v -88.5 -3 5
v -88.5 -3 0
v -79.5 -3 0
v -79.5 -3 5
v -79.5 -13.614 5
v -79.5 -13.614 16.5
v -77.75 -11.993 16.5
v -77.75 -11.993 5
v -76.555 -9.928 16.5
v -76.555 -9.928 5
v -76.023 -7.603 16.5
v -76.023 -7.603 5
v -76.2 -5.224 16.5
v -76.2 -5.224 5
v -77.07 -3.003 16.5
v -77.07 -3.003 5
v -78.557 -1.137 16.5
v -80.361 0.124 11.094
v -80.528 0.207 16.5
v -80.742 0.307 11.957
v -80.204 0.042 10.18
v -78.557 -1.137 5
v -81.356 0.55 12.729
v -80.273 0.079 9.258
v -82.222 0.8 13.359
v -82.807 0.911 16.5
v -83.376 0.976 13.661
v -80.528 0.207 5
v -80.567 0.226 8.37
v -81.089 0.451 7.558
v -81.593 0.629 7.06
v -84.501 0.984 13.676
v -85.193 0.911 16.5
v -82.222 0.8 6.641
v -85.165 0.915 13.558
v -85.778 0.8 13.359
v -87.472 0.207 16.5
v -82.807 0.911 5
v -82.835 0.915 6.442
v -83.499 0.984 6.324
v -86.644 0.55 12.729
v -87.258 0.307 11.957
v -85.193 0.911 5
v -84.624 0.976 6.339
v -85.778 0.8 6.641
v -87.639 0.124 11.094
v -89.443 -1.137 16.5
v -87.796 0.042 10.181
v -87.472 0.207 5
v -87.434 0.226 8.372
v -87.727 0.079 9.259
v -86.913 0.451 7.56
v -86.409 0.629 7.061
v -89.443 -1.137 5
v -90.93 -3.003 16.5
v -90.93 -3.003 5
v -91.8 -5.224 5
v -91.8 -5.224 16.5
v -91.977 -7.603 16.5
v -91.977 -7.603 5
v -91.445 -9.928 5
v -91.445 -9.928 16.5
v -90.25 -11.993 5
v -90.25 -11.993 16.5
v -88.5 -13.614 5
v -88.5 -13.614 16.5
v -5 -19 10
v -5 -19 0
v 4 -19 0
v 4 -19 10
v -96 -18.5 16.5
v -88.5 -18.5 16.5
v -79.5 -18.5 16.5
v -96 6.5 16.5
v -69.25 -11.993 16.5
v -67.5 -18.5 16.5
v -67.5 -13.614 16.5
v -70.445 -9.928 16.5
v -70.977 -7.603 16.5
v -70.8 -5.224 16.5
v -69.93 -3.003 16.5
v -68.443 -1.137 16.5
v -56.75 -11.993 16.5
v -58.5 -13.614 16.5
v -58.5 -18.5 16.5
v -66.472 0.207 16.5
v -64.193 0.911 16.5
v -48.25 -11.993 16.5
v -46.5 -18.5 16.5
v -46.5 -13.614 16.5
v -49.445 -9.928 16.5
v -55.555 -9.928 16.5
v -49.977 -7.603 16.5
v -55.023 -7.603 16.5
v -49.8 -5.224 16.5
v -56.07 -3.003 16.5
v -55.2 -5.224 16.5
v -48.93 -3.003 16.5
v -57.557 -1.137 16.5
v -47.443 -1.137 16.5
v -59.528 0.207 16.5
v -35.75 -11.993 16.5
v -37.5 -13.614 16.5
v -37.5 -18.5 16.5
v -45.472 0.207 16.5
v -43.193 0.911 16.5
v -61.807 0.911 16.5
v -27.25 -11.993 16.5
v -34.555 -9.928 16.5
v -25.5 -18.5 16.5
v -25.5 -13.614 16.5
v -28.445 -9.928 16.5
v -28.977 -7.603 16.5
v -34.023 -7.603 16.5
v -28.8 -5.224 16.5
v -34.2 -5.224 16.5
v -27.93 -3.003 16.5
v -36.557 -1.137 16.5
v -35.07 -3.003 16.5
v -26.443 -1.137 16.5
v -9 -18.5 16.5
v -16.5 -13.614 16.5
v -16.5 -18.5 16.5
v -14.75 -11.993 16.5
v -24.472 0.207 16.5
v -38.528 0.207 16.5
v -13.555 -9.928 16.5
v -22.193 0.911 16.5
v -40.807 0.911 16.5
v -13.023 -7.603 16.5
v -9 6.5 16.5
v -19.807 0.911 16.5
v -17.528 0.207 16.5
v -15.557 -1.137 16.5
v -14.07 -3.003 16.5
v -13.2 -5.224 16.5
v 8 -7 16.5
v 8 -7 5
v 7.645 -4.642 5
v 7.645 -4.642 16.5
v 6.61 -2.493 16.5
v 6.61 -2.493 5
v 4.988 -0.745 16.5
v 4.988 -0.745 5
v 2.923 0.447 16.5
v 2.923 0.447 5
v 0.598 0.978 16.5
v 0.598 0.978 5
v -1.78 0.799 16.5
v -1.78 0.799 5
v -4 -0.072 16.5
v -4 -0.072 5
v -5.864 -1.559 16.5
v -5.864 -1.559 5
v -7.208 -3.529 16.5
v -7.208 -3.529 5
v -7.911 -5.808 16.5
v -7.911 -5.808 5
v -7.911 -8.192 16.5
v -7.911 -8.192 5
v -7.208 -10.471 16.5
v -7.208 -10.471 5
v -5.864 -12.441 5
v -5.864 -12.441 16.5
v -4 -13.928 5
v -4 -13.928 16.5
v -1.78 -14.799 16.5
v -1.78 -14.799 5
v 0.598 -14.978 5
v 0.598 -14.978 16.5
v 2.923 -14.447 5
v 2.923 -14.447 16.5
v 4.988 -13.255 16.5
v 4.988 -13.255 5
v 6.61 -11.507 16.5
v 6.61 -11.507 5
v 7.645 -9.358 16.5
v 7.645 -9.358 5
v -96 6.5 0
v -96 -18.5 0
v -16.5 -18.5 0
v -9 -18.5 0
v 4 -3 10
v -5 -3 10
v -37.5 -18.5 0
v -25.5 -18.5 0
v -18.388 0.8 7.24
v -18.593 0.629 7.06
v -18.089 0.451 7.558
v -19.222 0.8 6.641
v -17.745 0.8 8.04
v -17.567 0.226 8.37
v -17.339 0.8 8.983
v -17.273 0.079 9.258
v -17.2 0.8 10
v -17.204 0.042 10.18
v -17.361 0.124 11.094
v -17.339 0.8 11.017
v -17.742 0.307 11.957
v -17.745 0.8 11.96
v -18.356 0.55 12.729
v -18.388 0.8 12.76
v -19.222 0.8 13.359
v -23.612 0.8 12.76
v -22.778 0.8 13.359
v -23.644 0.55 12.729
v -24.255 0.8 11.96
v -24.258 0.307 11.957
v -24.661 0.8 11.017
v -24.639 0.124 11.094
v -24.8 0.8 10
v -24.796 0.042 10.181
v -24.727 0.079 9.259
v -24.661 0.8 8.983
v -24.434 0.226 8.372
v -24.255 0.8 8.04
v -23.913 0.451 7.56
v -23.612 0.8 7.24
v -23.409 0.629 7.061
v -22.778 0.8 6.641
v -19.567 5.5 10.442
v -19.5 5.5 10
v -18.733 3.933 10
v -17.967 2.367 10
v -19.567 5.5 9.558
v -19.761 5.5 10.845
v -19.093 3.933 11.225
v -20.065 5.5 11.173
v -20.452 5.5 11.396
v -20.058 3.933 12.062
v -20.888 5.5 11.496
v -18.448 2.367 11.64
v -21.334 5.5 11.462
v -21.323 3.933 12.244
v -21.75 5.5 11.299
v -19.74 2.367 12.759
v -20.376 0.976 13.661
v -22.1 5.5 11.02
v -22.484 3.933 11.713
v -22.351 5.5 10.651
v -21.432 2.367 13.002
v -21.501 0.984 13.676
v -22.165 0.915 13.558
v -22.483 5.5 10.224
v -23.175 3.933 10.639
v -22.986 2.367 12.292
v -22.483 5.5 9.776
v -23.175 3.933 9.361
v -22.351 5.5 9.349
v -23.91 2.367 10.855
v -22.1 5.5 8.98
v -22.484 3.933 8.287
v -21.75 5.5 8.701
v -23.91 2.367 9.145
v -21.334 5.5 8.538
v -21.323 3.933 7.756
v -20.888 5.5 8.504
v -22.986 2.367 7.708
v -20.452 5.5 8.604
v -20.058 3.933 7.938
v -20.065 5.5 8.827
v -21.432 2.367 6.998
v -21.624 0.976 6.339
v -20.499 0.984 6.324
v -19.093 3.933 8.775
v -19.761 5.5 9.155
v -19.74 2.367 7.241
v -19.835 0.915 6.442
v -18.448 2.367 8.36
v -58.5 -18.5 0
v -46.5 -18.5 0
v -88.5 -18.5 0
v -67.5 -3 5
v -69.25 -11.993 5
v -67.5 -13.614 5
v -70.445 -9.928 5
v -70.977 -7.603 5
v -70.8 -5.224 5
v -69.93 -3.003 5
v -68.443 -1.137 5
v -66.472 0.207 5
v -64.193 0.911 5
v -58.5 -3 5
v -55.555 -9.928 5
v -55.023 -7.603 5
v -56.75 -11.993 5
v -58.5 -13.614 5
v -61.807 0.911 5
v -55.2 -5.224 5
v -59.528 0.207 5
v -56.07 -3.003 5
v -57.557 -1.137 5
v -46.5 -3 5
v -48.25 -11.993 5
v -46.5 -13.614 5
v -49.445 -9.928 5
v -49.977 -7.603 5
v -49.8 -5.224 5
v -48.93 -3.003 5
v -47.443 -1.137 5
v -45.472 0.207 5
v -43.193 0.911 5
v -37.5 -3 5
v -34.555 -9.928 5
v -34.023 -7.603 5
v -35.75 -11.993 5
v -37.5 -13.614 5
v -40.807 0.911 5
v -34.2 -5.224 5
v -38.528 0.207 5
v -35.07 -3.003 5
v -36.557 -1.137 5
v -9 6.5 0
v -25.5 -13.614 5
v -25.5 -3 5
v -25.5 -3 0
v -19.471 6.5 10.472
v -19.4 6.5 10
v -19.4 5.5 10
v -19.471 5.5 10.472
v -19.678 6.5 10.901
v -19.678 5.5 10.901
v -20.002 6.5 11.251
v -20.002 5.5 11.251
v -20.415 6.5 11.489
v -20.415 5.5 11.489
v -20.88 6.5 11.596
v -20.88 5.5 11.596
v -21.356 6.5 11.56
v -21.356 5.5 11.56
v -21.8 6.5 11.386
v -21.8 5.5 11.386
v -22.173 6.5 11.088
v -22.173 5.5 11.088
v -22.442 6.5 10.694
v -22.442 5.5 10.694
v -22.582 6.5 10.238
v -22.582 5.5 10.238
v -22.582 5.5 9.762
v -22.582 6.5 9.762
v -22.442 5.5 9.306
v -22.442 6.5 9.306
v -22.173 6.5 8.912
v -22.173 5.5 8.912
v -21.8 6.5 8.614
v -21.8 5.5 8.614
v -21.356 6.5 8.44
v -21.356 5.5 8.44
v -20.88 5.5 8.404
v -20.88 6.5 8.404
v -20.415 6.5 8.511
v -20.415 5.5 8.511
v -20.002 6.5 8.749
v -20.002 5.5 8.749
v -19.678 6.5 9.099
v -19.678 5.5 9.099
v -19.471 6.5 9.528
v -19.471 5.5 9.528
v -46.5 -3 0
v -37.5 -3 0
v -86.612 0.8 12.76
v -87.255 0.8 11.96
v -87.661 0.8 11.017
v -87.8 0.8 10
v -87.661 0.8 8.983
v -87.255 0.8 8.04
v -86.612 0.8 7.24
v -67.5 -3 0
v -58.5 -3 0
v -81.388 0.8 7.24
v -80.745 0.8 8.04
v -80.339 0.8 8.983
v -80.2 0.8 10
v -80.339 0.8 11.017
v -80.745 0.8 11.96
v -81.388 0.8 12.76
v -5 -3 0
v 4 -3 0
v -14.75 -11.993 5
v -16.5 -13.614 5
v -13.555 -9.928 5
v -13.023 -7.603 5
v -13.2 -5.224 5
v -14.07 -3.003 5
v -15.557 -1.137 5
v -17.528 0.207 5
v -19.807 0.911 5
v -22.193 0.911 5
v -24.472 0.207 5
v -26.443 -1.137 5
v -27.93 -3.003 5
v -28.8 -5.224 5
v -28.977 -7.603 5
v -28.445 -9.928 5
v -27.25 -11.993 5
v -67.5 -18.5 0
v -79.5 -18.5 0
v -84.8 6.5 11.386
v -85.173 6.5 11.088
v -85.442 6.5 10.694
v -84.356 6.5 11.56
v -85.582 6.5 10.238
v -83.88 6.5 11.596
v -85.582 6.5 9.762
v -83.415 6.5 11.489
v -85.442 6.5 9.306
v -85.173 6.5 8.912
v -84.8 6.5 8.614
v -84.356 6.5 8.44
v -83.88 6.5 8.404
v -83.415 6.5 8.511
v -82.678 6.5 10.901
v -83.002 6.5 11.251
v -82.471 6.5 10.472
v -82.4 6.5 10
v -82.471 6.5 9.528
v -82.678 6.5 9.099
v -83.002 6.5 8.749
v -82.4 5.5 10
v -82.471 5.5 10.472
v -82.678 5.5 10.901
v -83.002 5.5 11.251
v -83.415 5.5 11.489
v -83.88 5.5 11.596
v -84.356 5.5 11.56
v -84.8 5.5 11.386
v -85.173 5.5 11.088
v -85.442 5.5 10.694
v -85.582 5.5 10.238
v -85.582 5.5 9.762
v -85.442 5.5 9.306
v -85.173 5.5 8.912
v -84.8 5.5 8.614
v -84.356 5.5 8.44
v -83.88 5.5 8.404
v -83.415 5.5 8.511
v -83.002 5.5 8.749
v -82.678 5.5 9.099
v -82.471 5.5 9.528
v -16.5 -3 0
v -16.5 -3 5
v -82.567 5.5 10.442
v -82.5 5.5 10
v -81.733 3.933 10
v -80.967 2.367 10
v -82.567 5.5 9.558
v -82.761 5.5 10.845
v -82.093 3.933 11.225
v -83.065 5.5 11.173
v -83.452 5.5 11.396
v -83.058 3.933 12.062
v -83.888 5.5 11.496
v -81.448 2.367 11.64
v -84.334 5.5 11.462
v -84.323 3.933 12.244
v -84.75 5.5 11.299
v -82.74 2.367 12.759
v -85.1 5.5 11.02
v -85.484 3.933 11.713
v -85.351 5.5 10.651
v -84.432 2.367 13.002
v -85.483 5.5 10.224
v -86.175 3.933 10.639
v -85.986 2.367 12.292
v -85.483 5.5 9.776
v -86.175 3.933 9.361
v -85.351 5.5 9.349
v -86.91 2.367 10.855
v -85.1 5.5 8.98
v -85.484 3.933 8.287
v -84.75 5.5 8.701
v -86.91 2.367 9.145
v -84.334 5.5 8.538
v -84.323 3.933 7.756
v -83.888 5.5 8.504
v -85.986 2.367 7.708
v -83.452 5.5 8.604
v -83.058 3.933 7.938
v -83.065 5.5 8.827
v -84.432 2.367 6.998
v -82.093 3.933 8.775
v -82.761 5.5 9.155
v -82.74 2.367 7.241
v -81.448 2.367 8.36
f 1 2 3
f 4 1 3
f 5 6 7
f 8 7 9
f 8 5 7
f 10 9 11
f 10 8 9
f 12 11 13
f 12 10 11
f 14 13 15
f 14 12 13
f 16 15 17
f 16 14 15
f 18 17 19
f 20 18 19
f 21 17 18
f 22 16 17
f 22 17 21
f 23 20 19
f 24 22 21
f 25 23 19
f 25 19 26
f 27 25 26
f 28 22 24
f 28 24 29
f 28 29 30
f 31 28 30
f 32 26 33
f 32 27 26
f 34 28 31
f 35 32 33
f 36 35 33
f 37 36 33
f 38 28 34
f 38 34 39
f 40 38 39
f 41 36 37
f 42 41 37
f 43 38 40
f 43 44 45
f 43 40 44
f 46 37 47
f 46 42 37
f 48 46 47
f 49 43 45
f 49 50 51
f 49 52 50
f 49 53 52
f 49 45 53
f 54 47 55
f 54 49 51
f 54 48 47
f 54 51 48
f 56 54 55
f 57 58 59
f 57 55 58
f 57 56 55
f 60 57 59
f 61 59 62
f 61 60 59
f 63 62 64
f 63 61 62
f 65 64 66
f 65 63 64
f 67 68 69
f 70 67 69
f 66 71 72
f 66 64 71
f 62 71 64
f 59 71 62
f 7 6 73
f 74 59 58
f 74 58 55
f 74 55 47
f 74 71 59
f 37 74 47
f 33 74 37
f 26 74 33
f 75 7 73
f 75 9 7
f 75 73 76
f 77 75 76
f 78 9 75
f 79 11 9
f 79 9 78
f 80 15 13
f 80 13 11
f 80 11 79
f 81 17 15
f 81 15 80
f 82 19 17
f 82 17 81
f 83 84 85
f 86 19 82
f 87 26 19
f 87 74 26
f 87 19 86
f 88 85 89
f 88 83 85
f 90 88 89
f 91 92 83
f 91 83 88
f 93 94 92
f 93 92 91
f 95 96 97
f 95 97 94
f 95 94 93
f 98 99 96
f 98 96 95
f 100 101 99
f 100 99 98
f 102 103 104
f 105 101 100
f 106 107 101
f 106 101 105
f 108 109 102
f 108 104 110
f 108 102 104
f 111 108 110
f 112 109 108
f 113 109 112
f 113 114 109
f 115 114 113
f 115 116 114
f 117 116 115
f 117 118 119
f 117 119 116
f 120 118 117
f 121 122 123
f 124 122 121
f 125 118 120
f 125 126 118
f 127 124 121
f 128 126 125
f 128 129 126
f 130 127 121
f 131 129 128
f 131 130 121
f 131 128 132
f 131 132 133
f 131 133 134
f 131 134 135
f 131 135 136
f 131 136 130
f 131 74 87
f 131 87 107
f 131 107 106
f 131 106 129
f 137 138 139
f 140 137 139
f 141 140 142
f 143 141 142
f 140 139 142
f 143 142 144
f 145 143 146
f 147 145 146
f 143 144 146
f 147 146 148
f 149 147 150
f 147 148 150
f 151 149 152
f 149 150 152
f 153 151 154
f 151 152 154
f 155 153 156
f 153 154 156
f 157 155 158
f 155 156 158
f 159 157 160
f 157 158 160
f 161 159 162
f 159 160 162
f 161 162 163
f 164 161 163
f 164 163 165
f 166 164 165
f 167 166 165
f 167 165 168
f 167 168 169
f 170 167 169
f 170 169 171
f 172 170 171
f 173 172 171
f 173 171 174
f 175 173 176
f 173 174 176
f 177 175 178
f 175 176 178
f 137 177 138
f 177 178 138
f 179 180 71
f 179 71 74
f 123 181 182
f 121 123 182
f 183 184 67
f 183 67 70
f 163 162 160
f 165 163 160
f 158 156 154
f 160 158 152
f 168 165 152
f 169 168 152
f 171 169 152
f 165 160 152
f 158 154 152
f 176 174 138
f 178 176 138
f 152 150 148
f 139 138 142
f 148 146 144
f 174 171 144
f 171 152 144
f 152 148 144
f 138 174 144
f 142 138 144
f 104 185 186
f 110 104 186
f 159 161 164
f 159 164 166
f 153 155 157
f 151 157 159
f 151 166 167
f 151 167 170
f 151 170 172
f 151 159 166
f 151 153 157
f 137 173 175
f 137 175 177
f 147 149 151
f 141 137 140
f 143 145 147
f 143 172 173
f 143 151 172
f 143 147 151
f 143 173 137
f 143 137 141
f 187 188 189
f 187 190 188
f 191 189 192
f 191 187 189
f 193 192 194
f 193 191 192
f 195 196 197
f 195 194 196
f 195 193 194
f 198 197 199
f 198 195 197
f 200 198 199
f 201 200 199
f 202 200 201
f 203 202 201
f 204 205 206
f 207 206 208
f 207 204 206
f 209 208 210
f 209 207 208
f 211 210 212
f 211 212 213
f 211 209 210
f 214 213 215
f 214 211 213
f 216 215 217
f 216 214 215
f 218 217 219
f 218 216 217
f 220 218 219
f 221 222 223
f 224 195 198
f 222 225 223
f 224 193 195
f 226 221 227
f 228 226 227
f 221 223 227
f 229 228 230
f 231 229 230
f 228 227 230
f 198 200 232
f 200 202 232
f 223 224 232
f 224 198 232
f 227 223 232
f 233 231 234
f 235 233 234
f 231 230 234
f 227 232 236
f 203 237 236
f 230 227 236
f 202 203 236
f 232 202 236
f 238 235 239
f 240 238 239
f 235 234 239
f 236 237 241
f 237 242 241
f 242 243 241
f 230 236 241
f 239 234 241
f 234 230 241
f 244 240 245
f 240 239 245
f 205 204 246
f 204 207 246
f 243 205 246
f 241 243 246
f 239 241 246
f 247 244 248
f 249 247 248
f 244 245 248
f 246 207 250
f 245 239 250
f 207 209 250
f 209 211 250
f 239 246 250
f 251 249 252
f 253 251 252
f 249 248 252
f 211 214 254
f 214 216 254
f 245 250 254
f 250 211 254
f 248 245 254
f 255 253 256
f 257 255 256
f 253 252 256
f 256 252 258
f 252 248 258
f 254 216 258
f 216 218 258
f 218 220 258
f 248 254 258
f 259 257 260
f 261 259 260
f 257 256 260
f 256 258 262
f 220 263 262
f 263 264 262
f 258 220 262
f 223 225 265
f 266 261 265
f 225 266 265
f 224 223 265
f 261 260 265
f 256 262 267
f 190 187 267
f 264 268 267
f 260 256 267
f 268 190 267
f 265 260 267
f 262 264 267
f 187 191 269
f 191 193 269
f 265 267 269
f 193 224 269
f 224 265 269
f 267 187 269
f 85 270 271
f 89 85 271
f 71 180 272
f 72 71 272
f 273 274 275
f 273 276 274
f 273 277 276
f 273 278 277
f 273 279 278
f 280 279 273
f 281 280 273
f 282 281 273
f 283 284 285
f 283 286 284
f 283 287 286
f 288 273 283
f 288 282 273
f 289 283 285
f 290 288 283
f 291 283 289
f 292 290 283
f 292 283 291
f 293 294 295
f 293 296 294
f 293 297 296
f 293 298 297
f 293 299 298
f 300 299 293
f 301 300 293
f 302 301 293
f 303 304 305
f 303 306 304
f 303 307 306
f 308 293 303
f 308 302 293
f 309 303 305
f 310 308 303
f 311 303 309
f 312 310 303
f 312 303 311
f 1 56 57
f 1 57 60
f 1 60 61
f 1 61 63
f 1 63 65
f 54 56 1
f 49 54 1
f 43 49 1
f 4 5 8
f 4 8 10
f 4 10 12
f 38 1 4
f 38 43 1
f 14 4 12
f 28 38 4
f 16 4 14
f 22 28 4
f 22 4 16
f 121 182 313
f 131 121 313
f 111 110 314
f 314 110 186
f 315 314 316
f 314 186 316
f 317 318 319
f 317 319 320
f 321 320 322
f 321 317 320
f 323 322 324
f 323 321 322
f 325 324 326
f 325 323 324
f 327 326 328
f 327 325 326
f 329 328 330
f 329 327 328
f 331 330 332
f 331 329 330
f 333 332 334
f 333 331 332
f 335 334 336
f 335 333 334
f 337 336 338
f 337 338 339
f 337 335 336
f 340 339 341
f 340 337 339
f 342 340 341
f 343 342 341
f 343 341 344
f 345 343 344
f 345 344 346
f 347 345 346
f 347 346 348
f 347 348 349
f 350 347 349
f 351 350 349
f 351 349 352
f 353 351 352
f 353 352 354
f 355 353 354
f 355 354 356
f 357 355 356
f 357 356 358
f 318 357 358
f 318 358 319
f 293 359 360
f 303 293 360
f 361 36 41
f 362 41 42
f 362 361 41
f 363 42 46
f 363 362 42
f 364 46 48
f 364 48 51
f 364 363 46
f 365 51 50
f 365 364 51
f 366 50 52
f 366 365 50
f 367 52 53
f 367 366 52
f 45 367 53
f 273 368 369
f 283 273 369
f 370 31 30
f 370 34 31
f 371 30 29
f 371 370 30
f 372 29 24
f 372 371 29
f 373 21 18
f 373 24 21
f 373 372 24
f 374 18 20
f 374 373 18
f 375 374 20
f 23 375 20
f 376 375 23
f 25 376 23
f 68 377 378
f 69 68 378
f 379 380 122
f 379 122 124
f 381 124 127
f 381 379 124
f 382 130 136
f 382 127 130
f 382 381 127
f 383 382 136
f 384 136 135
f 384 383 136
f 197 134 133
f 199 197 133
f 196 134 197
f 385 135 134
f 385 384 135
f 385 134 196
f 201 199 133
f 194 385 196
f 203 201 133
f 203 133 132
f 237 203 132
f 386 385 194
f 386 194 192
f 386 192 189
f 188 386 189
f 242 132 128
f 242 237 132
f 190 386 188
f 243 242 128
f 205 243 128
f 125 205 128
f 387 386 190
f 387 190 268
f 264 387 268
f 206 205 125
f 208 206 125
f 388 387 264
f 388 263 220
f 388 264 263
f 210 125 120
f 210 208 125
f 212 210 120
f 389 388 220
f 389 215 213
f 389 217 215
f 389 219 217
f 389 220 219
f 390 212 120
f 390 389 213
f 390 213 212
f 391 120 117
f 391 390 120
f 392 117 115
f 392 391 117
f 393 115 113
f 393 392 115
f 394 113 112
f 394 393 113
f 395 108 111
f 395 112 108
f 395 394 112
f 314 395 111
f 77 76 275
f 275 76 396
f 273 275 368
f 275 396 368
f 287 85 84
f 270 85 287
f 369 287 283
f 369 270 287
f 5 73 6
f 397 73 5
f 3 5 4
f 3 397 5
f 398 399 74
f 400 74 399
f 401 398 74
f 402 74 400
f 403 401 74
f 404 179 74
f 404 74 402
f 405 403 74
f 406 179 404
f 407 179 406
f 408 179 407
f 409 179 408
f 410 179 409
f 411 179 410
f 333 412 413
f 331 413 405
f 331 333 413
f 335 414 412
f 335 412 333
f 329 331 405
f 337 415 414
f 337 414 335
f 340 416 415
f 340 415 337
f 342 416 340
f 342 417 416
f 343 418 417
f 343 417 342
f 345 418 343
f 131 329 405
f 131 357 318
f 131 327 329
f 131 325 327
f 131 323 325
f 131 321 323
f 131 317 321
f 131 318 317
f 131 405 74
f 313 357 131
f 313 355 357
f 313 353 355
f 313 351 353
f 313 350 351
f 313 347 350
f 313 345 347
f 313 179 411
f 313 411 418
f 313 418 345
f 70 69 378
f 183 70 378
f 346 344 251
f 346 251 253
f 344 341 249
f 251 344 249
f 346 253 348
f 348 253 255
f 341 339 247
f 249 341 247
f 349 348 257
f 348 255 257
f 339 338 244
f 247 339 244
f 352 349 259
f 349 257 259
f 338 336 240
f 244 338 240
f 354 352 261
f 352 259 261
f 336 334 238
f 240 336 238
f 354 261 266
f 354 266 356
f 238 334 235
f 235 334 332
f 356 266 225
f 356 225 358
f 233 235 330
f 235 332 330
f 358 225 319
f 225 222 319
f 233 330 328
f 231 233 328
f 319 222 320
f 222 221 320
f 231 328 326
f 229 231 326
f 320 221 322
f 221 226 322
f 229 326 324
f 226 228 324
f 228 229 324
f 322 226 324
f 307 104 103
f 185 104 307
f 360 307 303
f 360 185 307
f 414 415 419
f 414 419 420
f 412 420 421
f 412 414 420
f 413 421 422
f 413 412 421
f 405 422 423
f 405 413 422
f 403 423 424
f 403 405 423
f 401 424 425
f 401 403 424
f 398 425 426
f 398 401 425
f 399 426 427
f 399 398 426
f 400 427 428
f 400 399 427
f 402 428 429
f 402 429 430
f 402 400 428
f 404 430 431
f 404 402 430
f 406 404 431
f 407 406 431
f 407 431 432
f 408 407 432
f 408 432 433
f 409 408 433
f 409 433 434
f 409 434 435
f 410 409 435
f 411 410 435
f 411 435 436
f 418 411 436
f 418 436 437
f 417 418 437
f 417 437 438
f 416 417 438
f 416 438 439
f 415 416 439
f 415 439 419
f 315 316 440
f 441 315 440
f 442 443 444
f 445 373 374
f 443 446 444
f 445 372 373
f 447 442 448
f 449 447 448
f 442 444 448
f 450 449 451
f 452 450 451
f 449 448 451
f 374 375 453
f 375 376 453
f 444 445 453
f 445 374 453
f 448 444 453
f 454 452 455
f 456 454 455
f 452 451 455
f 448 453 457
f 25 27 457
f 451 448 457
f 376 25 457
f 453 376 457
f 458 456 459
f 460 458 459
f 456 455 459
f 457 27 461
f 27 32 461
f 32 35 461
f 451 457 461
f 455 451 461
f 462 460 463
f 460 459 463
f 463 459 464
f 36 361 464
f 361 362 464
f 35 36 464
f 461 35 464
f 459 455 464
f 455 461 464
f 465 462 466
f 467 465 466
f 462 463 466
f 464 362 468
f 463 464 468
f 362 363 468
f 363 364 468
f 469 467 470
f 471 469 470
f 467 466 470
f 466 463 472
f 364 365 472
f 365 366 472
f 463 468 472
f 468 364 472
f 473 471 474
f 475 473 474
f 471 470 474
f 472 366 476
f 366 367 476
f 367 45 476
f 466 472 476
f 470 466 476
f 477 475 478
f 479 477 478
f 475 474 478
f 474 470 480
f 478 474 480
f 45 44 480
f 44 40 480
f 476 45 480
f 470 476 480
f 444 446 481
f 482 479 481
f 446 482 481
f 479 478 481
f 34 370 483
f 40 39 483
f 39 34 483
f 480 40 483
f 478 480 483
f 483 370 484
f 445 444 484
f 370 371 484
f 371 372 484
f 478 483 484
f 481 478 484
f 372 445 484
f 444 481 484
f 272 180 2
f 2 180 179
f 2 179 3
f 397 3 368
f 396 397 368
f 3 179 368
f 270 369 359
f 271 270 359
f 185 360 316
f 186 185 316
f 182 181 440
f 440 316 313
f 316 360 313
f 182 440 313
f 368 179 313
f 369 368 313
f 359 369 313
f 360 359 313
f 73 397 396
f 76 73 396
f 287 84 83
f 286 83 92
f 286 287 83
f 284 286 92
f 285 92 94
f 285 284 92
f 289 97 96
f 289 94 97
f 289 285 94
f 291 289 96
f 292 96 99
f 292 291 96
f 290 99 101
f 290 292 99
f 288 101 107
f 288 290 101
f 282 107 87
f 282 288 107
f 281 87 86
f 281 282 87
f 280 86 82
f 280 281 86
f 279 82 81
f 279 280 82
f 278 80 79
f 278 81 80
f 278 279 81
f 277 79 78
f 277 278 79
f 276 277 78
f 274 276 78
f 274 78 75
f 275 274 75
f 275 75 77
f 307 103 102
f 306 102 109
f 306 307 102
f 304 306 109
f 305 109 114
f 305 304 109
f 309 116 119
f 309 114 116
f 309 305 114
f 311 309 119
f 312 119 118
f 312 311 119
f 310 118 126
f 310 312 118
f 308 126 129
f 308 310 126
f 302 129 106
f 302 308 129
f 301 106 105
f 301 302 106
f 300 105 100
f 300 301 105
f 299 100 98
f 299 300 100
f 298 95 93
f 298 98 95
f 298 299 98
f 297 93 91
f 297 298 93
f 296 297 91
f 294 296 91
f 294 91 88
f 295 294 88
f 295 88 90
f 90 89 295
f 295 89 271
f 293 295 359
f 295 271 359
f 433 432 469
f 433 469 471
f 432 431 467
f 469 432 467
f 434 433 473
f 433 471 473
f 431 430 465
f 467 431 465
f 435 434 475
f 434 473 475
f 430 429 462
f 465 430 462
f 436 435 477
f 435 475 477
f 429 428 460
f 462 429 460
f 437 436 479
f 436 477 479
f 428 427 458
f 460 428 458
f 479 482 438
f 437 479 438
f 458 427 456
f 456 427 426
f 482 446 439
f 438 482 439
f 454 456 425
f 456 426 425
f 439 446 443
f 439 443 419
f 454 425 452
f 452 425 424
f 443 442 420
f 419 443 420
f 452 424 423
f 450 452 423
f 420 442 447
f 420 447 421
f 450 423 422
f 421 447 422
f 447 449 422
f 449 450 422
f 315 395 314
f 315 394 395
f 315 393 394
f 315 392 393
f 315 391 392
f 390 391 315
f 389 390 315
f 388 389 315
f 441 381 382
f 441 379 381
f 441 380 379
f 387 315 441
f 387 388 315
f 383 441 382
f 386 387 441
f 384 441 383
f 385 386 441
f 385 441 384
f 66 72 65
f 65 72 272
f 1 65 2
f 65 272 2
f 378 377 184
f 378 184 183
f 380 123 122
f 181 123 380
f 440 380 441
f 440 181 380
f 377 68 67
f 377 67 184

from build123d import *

# Parameters (mm, degrees)
BOX_W                  = 9
BOX_H                  = 16
BOX_DEPTH              = 10
CYLINDER_R             = 8
CYLINDER_DEPTH         = 11.5
CONE_ROLL_ANGLE        = 90
CYLINDER005_R          = 1.6
CYLINDER005_DEPTH      = 10
CYLINDER005_ROLL_ANGLE = 90
CYLINDER006_R          = 3.8
CYLINDER006_DEPTH      = 2
CYLINDER006_ROLL_ANGLE = 90
CONE001_ROLL_ANGLE     = 90
CYLINDER007_R          = 1.6
CYLINDER007_DEPTH      = 10
CYLINDER007_ROLL_ANGLE = 90
CYLINDER008_R          = 3.8
CYLINDER008_DEPTH      = 2
CYLINDER008_ROLL_ANGLE = 90
BOX002_W               = 9
BOX002_H               = 16
BOX002_DEPTH           = 18
CYLINDER002_R          = 8
CYLINDER002_DEPTH      = 11.5
BOX005_W               = 9
BOX005_H               = 16
BOX005_DEPTH           = 18
CYLINDER003_R          = 8
CYLINDER003_DEPTH      = 11.5
CYLINDER004_R          = 8
CYLINDER004_DEPTH      = 11.5
BOX003_W               = 9
BOX003_H               = 16
BOX003_DEPTH           = 18
BOX004_W               = 9
BOX004_H               = 16
BOX004_DEPTH           = 18
CYLINDER001_R          = 8
CYLINDER001_DEPTH      = 11.5
BOX001_W               = 87
BOX001_H               = 25
BOX001_DEPTH           = 16.5


with BuildPart() as cube:
    # Box → Box (new body)
    with BuildSketch(Plane(origin=(-5, -19, 0), x_dir=(1, 0, 0), z_dir=(0, 0, 1))):
        with Locations((4.5, 8)):
            Rectangle(BOX_W, BOX_H)
    extrude(amount=BOX_DEPTH)


with BuildPart() as cylinder:
    # Cylinder → Cylinder (new body)
    with BuildSketch(Plane(origin=(0, -7, 5), x_dir=(1, 0, 0), z_dir=(0, 0, 1))):
        Circle(CYLINDER_R)
    extrude(amount=CYLINDER_DEPTH)


with BuildPart() as cone:
    # Cone → Cone (revolve)
    with BuildSketch(Plane.XZ):
        Polygon((0, 0), (1.5, 0), (3.8, 4.7), (0, 4.7), align=None)
    revolve(axis=Axis((0, 0, 0), (0, 0, 1)))


with BuildPart() as cone_1:
    # Cone roll: moved
    add(cone.part.rotate(Axis((0, 0, 0), (1, 0, 0)), CONE_ROLL_ANGLE))


with BuildPart() as cone_2:
    # Cone placement: moved
    add(cone_1.part.moved(Location((-21, 0, 10))))


with BuildPart() as cylinder005:
    # Cylinder005 → Cylinder005 (new body)
    with BuildSketch(Plane.XY):
        Circle(CYLINDER005_R)
    extrude(amount=CYLINDER005_DEPTH)


with BuildPart() as cylinder005_1:
    # Cylinder005 roll: moved
    add(cylinder005.part.rotate(Axis((0, 0, 0), (1, 0, 0)), CYLINDER005_ROLL_ANGLE))


with BuildPart() as cylinder005_2:
    # Cylinder005 placement: moved
    add(cylinder005_1.part.moved(Location((-21, 10, 10))))


with BuildPart() as schraubenloch:
    # Cylinder006 → Cylinder006 (new body)
    with BuildSketch(Plane.XY):
        Circle(CYLINDER006_R)
    extrude(amount=CYLINDER006_DEPTH)


with BuildPart() as schraubenloch_1:
    # Cylinder006 roll: moved
    add(schraubenloch.part.rotate(Axis((0, 0, 0), (1, 0, 0)), CYLINDER006_ROLL_ANGLE))


with BuildPart() as schraubenloch_2:
    # Cylinder006 placement: moved
    add(schraubenloch_1.part.moved(Location((-21, -4.7, 10))))

    # Fusion004: union Cone, Cylinder005
    add(cone_2.part)
    add(cylinder005_2.part)


with BuildPart() as schraubenloch_3:
    # Fusion004 placement: moved
    add(schraubenloch_2.part.moved(Location((0, 5.5, 0))))


with BuildPart() as cone001:
    # Cone001 → Cone001 (revolve)
    with BuildSketch(Plane.XZ):
        Polygon((0, 0), (1.5, 0), (3.8, 4.7), (0, 4.7), align=None)
    revolve(axis=Axis((0, 0, 0), (0, 0, 1)))


with BuildPart() as cone001_1:
    # Cone001 roll: moved
    add(cone001.part.rotate(Axis((0, 0, 0), (1, 0, 0)), CONE001_ROLL_ANGLE))


with BuildPart() as cone001_2:
    # Cone001 placement: moved
    add(cone001_1.part.moved(Location((-21, 0, 10))))


with BuildPart() as cylinder007:
    # Cylinder007 → Cylinder007 (new body)
    with BuildSketch(Plane.XY):
        Circle(CYLINDER007_R)
    extrude(amount=CYLINDER007_DEPTH)


with BuildPart() as cylinder007_1:
    # Cylinder007 roll: moved
    add(cylinder007.part.rotate(Axis((0, 0, 0), (1, 0, 0)), CYLINDER007_ROLL_ANGLE))


with BuildPart() as cylinder007_2:
    # Cylinder007 placement: moved
    add(cylinder007_1.part.moved(Location((-21, 10, 10))))


with BuildPart() as schraubenloecher:
    # Cylinder008 → Cylinder008 (new body)
    with BuildSketch(Plane.XY):
        Circle(CYLINDER008_R)
    extrude(amount=CYLINDER008_DEPTH)


with BuildPart() as schraubenloecher_1:
    # Cylinder008 roll: moved
    add(schraubenloecher.part.rotate(Axis((0, 0, 0), (1, 0, 0)), CYLINDER008_ROLL_ANGLE))


with BuildPart() as schraubenloecher_2:
    # Cylinder008 placement: moved
    add(schraubenloecher_1.part.moved(Location((-21, -4.7, 10))))

    # Fusion005: union Cone001, Cylinder007
    add(cone001_2.part)
    add(cylinder007_2.part)


with BuildPart() as schraubenloecher_3:
    # Fusion005 placement: moved
    add(schraubenloecher_2.part.moved(Location((-63, 5.5, 0))))

    # Fusion006: union Schraubenloch
    add(schraubenloch_3.part)


with BuildPart() as cube002:
    # Box002 → Box002 (new body)
    with BuildSketch(Plane(origin=(-25.5, -19, 0), x_dir=(1, 0, 0), z_dir=(0, 0, 1))):
        with Locations((4.5, 8)):
            Rectangle(BOX002_W, BOX002_H)
    extrude(amount=BOX002_DEPTH)


with BuildPart() as cylinder002:
    # Cylinder002 → Cylinder002 (new body)
    with BuildSketch(Plane(origin=(-42, -7, 5), x_dir=(1, 0, 0), z_dir=(0, 0, 1))):
        Circle(CYLINDER002_R)
    extrude(amount=CYLINDER002_DEPTH)


with BuildPart() as cube005:
    # Box005 → Box005 (new body)
    with BuildSketch(Plane(origin=(-88.5, -19, 0), x_dir=(1, 0, 0), z_dir=(0, 0, 1))):
        with Locations((4.5, 8)):
            Rectangle(BOX005_W, BOX005_H)
    extrude(amount=BOX005_DEPTH)


with BuildPart() as cylinder003:
    # Cylinder003 → Cylinder003 (new body)
    with BuildSketch(Plane(origin=(-63, -7, 5), x_dir=(1, 0, 0), z_dir=(0, 0, 1))):
        Circle(CYLINDER003_R)
    extrude(amount=CYLINDER003_DEPTH)


with BuildPart() as cylinder004:
    # Cylinder004 → Cylinder004 (new body)
    with BuildSketch(Plane(origin=(-84, -7, 5), x_dir=(1, 0, 0), z_dir=(0, 0, 1))):
        Circle(CYLINDER004_R)
    extrude(amount=CYLINDER004_DEPTH)


with BuildPart() as cube003:
    # Box003 → Box003 (new body)
    with BuildSketch(Plane(origin=(-46.5, -19, 0), x_dir=(1, 0, 0), z_dir=(0, 0, 1))):
        with Locations((4.5, 8)):
            Rectangle(BOX003_W, BOX003_H)
    extrude(amount=BOX003_DEPTH)


with BuildPart() as cube004:
    # Box004 → Box004 (new body)
    with BuildSketch(Plane(origin=(-67.5, -19, 0), x_dir=(1, 0, 0), z_dir=(0, 0, 1))):
        with Locations((4.5, 8)):
            Rectangle(BOX004_W, BOX004_H)
    extrude(amount=BOX004_DEPTH)


with BuildPart() as fusion:
    # Cylinder001 → Cylinder001 (new body)
    with BuildSketch(Plane(origin=(-21, -7, 5), x_dir=(1, 0, 0), z_dir=(0, 0, 1))):
        Circle(CYLINDER001_R)
    extrude(amount=CYLINDER001_DEPTH)

    # Fusion: union Cube002, Cylinder002, Cube005, Cylinder003, Cylinder004, Cube003, Cube004
    add(cube002.part)
    add(cylinder002.part)
    add(cube005.part)
    add(cylinder003.part)
    add(cylinder004.part)
    add(cube003.part)
    add(cube004.part)


with BuildPart() as cut001:
    # Box001 → Box001 (new body)
    with BuildSketch(Plane(origin=(-96, -18.5, 0), x_dir=(1, 0, 0), z_dir=(0, 0, 1))):
        with Locations((43.5, 12.5)):
            Rectangle(BOX001_W, BOX001_H)
    extrude(amount=BOX001_DEPTH)

    # Cut: cut Fusion
    add(fusion.part, mode=Mode.SUBTRACT)

    # Cut001: cut Schraubenloecher
    add(schraubenloecher_3.part, mode=Mode.SUBTRACT)


solid = Compound([cube.part, cylinder.part, cut001.part])
